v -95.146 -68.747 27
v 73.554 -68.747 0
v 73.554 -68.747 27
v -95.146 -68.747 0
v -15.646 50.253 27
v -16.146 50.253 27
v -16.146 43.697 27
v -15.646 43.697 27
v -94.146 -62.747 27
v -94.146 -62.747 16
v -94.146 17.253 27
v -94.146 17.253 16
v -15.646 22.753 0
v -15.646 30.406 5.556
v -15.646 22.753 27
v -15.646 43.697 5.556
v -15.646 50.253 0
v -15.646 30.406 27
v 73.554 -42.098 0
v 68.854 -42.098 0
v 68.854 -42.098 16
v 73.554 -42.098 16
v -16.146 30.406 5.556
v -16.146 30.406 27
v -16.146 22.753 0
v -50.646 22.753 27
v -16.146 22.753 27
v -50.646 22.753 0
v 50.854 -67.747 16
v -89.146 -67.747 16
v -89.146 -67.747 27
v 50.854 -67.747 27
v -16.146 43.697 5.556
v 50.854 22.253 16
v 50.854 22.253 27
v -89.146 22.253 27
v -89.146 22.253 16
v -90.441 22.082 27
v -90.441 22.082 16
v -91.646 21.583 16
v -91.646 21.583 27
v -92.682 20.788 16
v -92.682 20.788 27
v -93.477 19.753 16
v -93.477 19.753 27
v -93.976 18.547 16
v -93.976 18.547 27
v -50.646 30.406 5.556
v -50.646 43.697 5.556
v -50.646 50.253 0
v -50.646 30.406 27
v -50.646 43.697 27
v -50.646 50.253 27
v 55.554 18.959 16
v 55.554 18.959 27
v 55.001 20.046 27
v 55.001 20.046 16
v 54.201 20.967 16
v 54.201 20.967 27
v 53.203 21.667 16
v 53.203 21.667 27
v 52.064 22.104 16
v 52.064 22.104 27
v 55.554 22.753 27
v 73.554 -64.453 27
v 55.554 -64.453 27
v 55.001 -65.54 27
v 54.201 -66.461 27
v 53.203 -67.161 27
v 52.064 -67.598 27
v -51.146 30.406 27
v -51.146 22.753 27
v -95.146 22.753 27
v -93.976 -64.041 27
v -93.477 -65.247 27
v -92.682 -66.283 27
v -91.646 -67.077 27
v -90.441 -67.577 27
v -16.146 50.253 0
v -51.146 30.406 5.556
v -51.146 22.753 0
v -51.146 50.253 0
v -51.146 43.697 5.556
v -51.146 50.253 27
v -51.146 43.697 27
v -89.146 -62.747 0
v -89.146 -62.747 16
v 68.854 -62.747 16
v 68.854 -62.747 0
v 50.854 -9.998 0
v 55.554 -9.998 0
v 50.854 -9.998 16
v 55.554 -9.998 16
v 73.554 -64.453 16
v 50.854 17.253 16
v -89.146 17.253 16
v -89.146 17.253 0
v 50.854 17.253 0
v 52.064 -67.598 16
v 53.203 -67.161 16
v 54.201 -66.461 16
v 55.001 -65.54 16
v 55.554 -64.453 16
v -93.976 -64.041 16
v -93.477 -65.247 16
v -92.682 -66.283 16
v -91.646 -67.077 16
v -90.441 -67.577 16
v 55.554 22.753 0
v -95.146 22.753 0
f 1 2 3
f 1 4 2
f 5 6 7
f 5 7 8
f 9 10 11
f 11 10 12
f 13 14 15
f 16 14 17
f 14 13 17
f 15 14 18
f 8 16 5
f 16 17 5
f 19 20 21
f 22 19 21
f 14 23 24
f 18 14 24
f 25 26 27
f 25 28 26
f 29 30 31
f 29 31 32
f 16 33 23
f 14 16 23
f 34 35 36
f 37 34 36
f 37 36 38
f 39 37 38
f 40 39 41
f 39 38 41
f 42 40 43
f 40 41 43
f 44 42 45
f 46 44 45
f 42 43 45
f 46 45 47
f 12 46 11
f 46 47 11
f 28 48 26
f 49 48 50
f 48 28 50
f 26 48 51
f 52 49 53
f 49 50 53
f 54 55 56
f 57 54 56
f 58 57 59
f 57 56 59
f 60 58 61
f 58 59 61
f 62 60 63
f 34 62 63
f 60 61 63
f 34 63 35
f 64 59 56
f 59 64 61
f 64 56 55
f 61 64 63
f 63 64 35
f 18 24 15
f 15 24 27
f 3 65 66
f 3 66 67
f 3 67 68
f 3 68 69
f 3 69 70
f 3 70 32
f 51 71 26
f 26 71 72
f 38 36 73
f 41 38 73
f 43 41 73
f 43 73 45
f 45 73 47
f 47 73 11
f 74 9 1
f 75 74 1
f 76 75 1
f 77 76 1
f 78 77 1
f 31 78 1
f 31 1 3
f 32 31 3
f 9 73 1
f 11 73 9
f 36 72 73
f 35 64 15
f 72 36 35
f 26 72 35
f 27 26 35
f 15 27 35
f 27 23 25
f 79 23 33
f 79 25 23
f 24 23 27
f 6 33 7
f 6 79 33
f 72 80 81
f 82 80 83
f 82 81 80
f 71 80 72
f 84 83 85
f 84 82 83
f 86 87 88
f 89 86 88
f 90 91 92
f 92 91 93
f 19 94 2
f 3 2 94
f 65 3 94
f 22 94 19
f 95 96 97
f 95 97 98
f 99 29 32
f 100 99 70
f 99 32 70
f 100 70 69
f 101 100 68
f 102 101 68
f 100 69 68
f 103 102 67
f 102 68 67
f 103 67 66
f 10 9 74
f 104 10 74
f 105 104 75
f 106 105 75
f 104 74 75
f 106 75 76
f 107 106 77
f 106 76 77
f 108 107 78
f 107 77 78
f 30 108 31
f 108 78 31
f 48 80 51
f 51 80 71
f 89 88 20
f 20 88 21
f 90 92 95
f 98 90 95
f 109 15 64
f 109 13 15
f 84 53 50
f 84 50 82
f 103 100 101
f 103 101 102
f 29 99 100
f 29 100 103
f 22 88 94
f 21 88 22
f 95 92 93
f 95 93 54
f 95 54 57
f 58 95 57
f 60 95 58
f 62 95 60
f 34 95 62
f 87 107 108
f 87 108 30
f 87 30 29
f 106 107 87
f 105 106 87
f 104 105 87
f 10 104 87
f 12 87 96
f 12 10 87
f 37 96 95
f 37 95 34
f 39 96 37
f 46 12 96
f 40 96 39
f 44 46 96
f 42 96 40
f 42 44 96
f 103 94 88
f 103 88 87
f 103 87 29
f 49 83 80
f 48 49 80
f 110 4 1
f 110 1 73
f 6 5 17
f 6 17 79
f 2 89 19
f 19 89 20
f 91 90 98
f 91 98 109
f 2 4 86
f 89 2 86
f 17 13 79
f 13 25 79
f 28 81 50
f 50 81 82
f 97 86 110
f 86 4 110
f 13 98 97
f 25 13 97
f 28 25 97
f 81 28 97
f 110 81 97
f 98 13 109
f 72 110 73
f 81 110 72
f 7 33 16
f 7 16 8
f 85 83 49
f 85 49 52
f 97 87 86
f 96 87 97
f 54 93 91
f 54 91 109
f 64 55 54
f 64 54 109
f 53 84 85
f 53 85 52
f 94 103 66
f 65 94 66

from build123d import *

# Parameters (mm, degrees)
F0_W          = 170
F0_H          = 130
F1_DEPTH      = 34
F2_T          = -1
F3_W          = 43.5
F3_H          = 38
F4_DEPTH      = 32
F5_T          = 0.5
F5_T3_DEPTH   = 34
F5_T5_DEPTH   = 125.5
F5_T7_DEPTH   = 33
F5_T9_DEPTH   = 2
F5_T11_DEPTH  = 129
F5_T13_DEPTH  = 169
F5_T15_DEPTH  = 91
F5_T17_DEPTH  = 44.5
F5_T19_DEPTH  = 39
F6_W          = 35
F6_H          = 38
F7_DEPTH      = 32
F8_T          = 0.5
F8_T3_DEPTH   = 2
F8_T5_DEPTH   = 33
F8_T7_DEPTH   = 91
F8_T9_DEPTH   = 34
F8_T11_DEPTH  = 79.5
F8_T13_DEPTH  = 169
F8_T15_DEPTH  = 129
F8_T17_DEPTH  = 90.5
F8_T19_DEPTH  = 39
F8_T21_DEPTH  = 44.5
F8_T23_DEPTH  = 33.5
F8_T25_DEPTH  = 1.5
F8_T27_DEPTH  = 39
F8_T29_DEPTH  = 33
F8_T31_DEPTH  = 1.5
F8_T33_DEPTH  = 1.5
F8_T35_DEPTH  = 38.5
F8_T37_DEPTH  = 1.5000245068
F8_T39_DEPTH  = 1.5000245068
F8_T41_DEPTH  = 44
F9_W          = 89.5
F9_H          = 38
F10_DEPTH     = 32
F11_T         = 0.5
F11_T3_DEPTH  = 2
F11_T5_DEPTH  = 33
F11_T7_DEPTH  = 91
F11_T9_DEPTH  = 34
F11_T11_DEPTH = 169
F11_T13_DEPTH = 44.5
F11_T15_DEPTH = 33.5
F11_T17_DEPTH = 1.5
F11_T19_DEPTH = 39
F11_T21_DEPTH = 33
F11_T23_DEPTH = 1.5
F11_T25_DEPTH = 1.5
F11_T27_DEPTH = 38.5
F11_T29_DEPTH = 1.5000245068
F11_T31_DEPTH = 1.5000245068
F11_T33_DEPTH = 44
F11_T35_DEPTH = 35.5
F12_W         = 150
F12_H         = 90
F13_DEPTH     = 32
F15_DEPTH     = 17
F16_W         = 140
F16_H         = 80
F17_DEPTH     = 25
F18_DEPTH     = 25
F19_DEPTH     = 25
F20_DEPTH     = 25
F21_DEPTH     = 25
F24_W         = 170
F24_H         = 34
F25_DEPTH     = 11
F26_W         = 119
F26_H         = 34
F27_DEPTH     = 19.3
F28_W         = 32.0991082117
F28_H         = 16
F29_DEPTH     = 25
F30_W         = 13.2916904986
F30_H         = 28.4444186985
F31_DEPTH     = 96.3
F32_W         = 236.7293909192
F32_H         = 199.1855278611
F33_DEPTH     = 7
F34_DEPTH     = 18
F35_DEPTH     = 18
F36_DEPTH     = 27.5


# Not quite as in the source:
# - a feature of the source that left no trace in its solid (it failed there, or was rolled back) is left out
# - a shell that OpenCascade refuses in one call is made with other operations: the cavity is built on its own and cut out


with BuildPart() as f1:
    # F0 (on Top) → F1 (new body)
    with BuildSketch(Plane.XY):
        with Locations((-10.1464114764, -3.7471540272)):
            Rectangle(F0_W, F0_H)
    extrude(amount=F1_DEPTH)

    # F2
    f2_openings = [f1.faces().sort_by_distance(p)[0] for p in [
        (-10.146411, -3.747154, 34),
    ]]
    offset(amount=F2_T, openings=f2_openings)

    # F3 (on face) → F4 (join)
    with BuildSketch(Plane.XY.offset(1)):
        with Locations((-72.3964114764, 41.2528459728)):
            Rectangle(F3_W, F3_H)
    extrude(amount=F4_DEPTH)

    # F5: shell of thickness 0.5, made by hand


with BuildPart() as f5_core1:
    # F5_t2: copy of F1
    add(f1.part)

    # the walls: a layer under each face that stays
    f5_faces = [f5_core1.faces().sort_by_distance(p)[0] for p in [
        (-10.1464114764, 61.2528459728, 17),
        (74.8535885236, -3.7471540272, 17),
        (-95.1464114764, -3.7471540272, 17),
        (-10.1464114764, -3.7471540272, 0),
        (-3.5057864764, -68.2121746034, 34),
        (-10.1464114764, -68.7471540272, 17),
        (-10.1464114764, 60.2528459728, 17.5),
        (73.8535885236, -3.7471540272, 17.5),
        (-10.1464114764, -67.7471540272, 17.5),
        (-94.1464114764, -3.7471540272, 17.5),
        (-10.1464114764, -3.7471540272, 1),
        (-50.6464114764, 41.2528459728, 17),
        (-72.3964114764, 22.2528459728, 17),
    ]]
    thicken(f5_faces, amount=-F5_T, mode=Mode.SUBTRACT)

    # F5_s4 → F5_t3 (cut)
    with BuildSketch(Plane.XY.offset(0.5)):
        Polygon((73.8485885236, 60.2478459728), (73.8535885236, 60.7528459728), (74.3535885236, 60.7528459728), (74.3535885236, 60.2528459728), align=None)
        Polygon((73.8485885236, -67.7421540272), (74.3535885236, -67.7471540272), (74.3535885236, -68.2471540272), (73.8535885236, -68.2471540272), align=None)
        Polygon((-94.1414114764, -67.7421540272), (-94.1464114764, -68.2471540272), (-94.6464114764, -68.2471540272), (-94.6464114764, -67.7471540272), align=None)
    extrude(amount=F5_T3_DEPTH, mode=Mode.SUBTRACT)

    # F5_s6 → F5_t5 (cut)
    with BuildSketch(Plane.YZ.offset(-51.1464114764)):
        Polygon((60.2478459728, 1.005), (60.7528459728, 1), (60.7528459728, 0.5), (60.2528459728, 0.5), align=None)
    extrude(amount=F5_T5_DEPTH, mode=Mode.SUBTRACT)

    # F5_s8 → F5_t7 (cut)
    with BuildSketch(Plane.XY.offset(0.5)):
        Polygon((-50.6414114764, 60.2478459728), (-50.6464114764, 60.7528459728), (-51.1464114764, 60.7528459728), (-51.1464114764, 60.2528459728), align=None)
        Polygon((-94.1414114764, 22.2478459728), (-94.6464114764, 22.2528459728), (-94.6464114764, 22.7528459728), (-94.1464114764, 22.7528459728), align=None)
    extrude(amount=F5_T7_DEPTH, mode=Mode.SUBTRACT)

    # F5_s10 → F5_t9 (cut)
    with BuildSketch(Plane.XY.offset(32.5)):
        Polygon((-94.1414114764, 60.2478459728), (-94.1464114764, 60.7528459728), (-94.6464114764, 60.7528459728), (-94.6464114764, 60.2528459728), align=None)
    extrude(amount=F5_T9_DEPTH, mode=Mode.SUBTRACT)

    # F5_s12 → F5_t11 (cut)
    with BuildSketch(Plane.XZ.offset(-60.7528459728)):
        Polygon((73.8485885236, 1.005), (74.3535885236, 1), (74.3535885236, 0.5), (73.8535885236, 0.5), align=None)
    extrude(amount=F5_T11_DEPTH, mode=Mode.SUBTRACT)

    # F5_s14 → F5_t13 (cut)
    with BuildSketch(Plane.YZ.offset(-94.6464114764)):
        Polygon((-67.7421540272, 1.005), (-68.2471540272, 1), (-68.2471540272, 0.5), (-67.7471540272, 0.5), align=None)
    extrude(amount=F5_T13_DEPTH, mode=Mode.SUBTRACT)

    # F5_s16 → F5_t15 (cut)
    with BuildSketch(Plane.XZ.offset(-22.7528459728)):
        Polygon((-94.1414114764, 1.005), (-94.6464114764, 1), (-94.6464114764, 0.5), (-94.1464114764, 0.5), align=None)
    extrude(amount=F5_T15_DEPTH, mode=Mode.SUBTRACT)

    # F5_s18 → F5_t17 (cut)
    with BuildSketch(Plane.YZ.offset(-94.6464114764)):
        Polygon((22.2478459728, 1.005), (22.2528459728, 0.5), (22.7528459728, 0.5), (22.7528459728, 1), align=None)
    extrude(amount=F5_T17_DEPTH, mode=Mode.SUBTRACT)

    # F5_s20 → F5_t19 (cut)
    with BuildSketch(Plane.XZ.offset(-60.7528459728)):
        Polygon((-50.6414114764, 1.005), (-50.6464114764, 0.5), (-51.1464114764, 0.5), (-51.1464114764, 1), align=None)
    extrude(amount=F5_T19_DEPTH, mode=Mode.SUBTRACT)


with BuildPart() as f1_1:
    add(f1.part)

    # what is left inside the walls is the cavity
    f5_cavity = [f5_core1.part.solids().sort_by_distance(p)[0] for p in [
        (-72.896411, 35.419513, 0.505),
    ]]
    add(f5_cavity, mode=Mode.SUBTRACT)

    # F6 (on face) → F7 (join)
    with BuildSketch(Plane.XY.offset(1)):
        with Locations((-33.1464114764, 41.2528459728)):
            Rectangle(F6_W, F6_H)
    extrude(amount=F7_DEPTH)

    # F8: shell of thickness 0.5, made by hand


with BuildPart() as f8_core1:
    # F8_t2: copy of F1
    add(f1_1.part)

    # the walls: a layer under each face that stays
    f8_faces = [f8_core1.faces().sort_by_distance(p)[0] for p in [
        (-10.1464114764, 61.2528459728, 17),
        (-3.5057864764, -68.2121746034, 34),
        (-94.1464114764, -3.7471540272, 17.5),
        (-10.1464114764, -3.7471540272, 1),
        (-15.6464114764, 41.2528459728, 17),
        (-54.8964114764, 22.2528459728, 17),
        (-72.8964114764, 22.7528459728, 16.75),
        (-94.6464114764, 41.7528459728, 16.75),
        (-94.3939114764, 60.2503459728, 32.75),
        (-94.1439114764, 60.5003459728, 32.75),
        (-72.6464114764, 60.5028459728, 33),
        (-94.3939114764, 60.5003459728, 32.5),
        (-72.8964114764, 60.7528459728, 16.75),
        (-72.8964114764, 41.7528459728, 0.5),
        (-51.1464114764, 41.7528459728, 16.75),
        (-94.3964114764, 41.5028459728, 33),
        (-10.1464114764, -67.7471540272, 17.5),
        (73.8535885236, -3.7471540272, 17.5),
        (-10.1464114764, 60.2528459728, 17.5),
        (-10.1464114764, -68.7471540272, 17),
        (-10.1464114764, -3.7471540272, 0),
        (-95.1464114764, -3.7471540272, 17),
        (74.8535885236, -3.7471540272, 17),
    ]]
    thicken(f8_faces, amount=-F8_T, mode=Mode.SUBTRACT)

    # F8_s4 → F8_t3 (cut)
    with BuildSketch(Plane.XY.offset(32.5)):
        Polygon((-94.1414114764, 60.2478459728), (-94.6464114764, 60.2528459728), (-94.6464114764, 60.7528459728), (-94.1464114764, 60.7528459728), align=None)
    extrude(amount=F8_T3_DEPTH, mode=Mode.SUBTRACT)

    # F8_s6 → F8_t5 (cut)
    with BuildSketch(Plane.XY.offset(0.5)):
        Polygon((-94.1414114764, 22.2478459728), (-94.6464114764, 22.2528459728), (-94.6464114764, 22.7528459728), (-94.1464114764, 22.7528459728), align=None)
        Polygon((-15.6414114764, 60.2478459728), (-16.1464114764, 60.2528459728), (-16.1464114764, 60.7528459728), (-15.6464114764, 60.7528459728), align=None)
    extrude(amount=F8_T5_DEPTH, mode=Mode.SUBTRACT)

    # F8_s8 → F8_t7 (cut)
    with BuildSketch(Plane.XZ.offset(-22.7528459728)):
        Polygon((-94.1414114764, 1.005), (-94.6464114764, 1), (-94.6464114764, 0.5), (-94.1464114764, 0.5), align=None)
    extrude(amount=F8_T7_DEPTH, mode=Mode.SUBTRACT)

    # F8_s10 → F8_t9 (cut)
    with BuildSketch(Plane.XY.offset(0.5)):
        Polygon((-94.1414114764, -67.7421540272), (-94.6464114764, -67.7471540272), (-94.6464114764, -68.2471540272), (-94.1464114764, -68.2471540272), align=None)
        Polygon((73.8485885236, -67.7421540272), (73.8535885236, -68.2471540272), (74.3535885236, -68.2471540272), (74.3535885236, -67.7471540272), align=None)
        Polygon((73.8485885236, 60.2478459728), (74.3535885236, 60.2528459728), (74.3535885236, 60.7528459728), (73.8535885236, 60.7528459728), align=None)
    extrude(amount=F8_T9_DEPTH, mode=Mode.SUBTRACT)

    # F8_s12 → F8_t11 (cut)
    with BuildSketch(Plane.YZ.offset(-94.6464114764)):
        Polygon((22.2478459728, 1.005), (22.2528459728, 0.5), (22.7528459728, 0.5), (22.7528459728, 1), align=None)
    extrude(amount=F8_T11_DEPTH, mode=Mode.SUBTRACT)

    # F8_s14 → F8_t13 (cut)
    with BuildSketch(Plane.YZ.offset(-94.6464114764)):
        Polygon((-67.7421540272, 1.005), (-67.7471540272, 0.5), (-68.2471540272, 0.5), (-68.2471540272, 1), align=None)
    extrude(amount=F8_T13_DEPTH, mode=Mode.SUBTRACT)

    # F8_s16 → F8_t15 (cut)
    with BuildSketch(Plane.XZ.offset(-60.7528459728)):
        Polygon((73.8485885236, 1.005), (73.8535885236, 0.5), (74.3535885236, 0.5), (74.3535885236, 1), align=None)
    extrude(amount=F8_T15_DEPTH, mode=Mode.SUBTRACT)

    # F8_s18 → F8_t17 (cut)
    with BuildSketch(Plane.YZ.offset(-16.1464114764)):
        Polygon((60.2478459728, 1.005), (60.2528459728, 0.5), (60.7528459728, 0.5), (60.7528459728, 1), align=None)
    extrude(amount=F8_T17_DEPTH, mode=Mode.SUBTRACT)

    # F8_s20 → F8_t19 (cut)
    with BuildSketch(Plane.XZ.offset(-60.7528459728)):
        Polygon((-15.6414114764, 1.005), (-15.6464114764, 0.5), (-16.1464114764, 0.5), (-16.1464114764, 1), align=None)
    extrude(amount=F8_T19_DEPTH, mode=Mode.SUBTRACT)

    # F8_s22 → F8_t21 (cut)
    with BuildSketch(Plane.YZ.offset(-95.1464114764)):
        Polygon((22.7578459728, 0.505), (22.2528459728, 0.5), (22.2528459728, 0), (22.7528459728, 0), align=None)
        Polygon((60.7478459728, 0.505), (61.2528459728, 0.5), (61.2528459728, 0), (60.7528459728, 0), align=None)
    extrude(amount=F8_T21_DEPTH, mode=Mode.SUBTRACT)

    # F8_s24 → F8_t23 (cut)
    with BuildSketch(Plane.XY):
        Polygon((-94.6414114764, 22.7578459728), (-94.6464114764, 22.2528459728), (-95.1464114764, 22.2528459728), (-95.1464114764, 22.7528459728), align=None)
        Polygon((-51.1514114764, 22.7578459728), (-51.1464114764, 22.2528459728), (-50.6464114764, 22.2528459728), (-50.6464114764, 22.7528459728), align=None)
        Polygon((-51.1514114764, 60.7478459728), (-51.1464114764, 61.2528459728), (-50.6464114764, 61.2528459728), (-50.6464114764, 60.7528459728), align=None)
    extrude(amount=F8_T23_DEPTH, mode=Mode.SUBTRACT)

    # F8_s26 → F8_t25 (cut)
    with BuildSketch(Plane.YZ.offset(-95.1464114764)):
        Polygon((22.7578459728, 32.995), (22.2528459728, 33), (22.2528459728, 33.5), (22.7528459728, 33.5), align=None)
        Polygon((60.7478459728, 32.495), (60.7528459728, 33), (61.2528459728, 33), (61.2528459728, 32.5), align=None)
    extrude(amount=F8_T25_DEPTH, mode=Mode.SUBTRACT)

    # F8_s28 → F8_t27 (cut)
    with BuildSketch(Plane.XZ.offset(-61.2528459728)):
        Polygon((-94.6414114764, 0.505), (-95.1464114764, 0.5), (-95.1464114764, 0), (-94.6464114764, 0), align=None)
        Polygon((-51.1514114764, 0.505), (-51.1464114764, 0), (-50.6464114764, 0), (-50.6464114764, 0.5), align=None)
    extrude(amount=F8_T27_DEPTH, mode=Mode.SUBTRACT)

    # F8_s30 → F8_t29 (cut)
    with BuildSketch(Plane.XY):
        Polygon((-94.6414114764, 60.7478459728), (-95.1464114764, 60.7528459728), (-95.1464114764, 61.2528459728), (-94.6464114764, 61.2528459728), align=None)
    extrude(amount=F8_T29_DEPTH, mode=Mode.SUBTRACT)

    # F8_s32 → F8_t31 (cut)
    with BuildSketch(Plane.XZ.offset(-61.2528459728)):
        Polygon((-94.6414114764, 32.495), (-95.1464114764, 32.5), (-95.1464114764, 33), (-94.6464114764, 33), align=None)
        Polygon((-51.1514114764, 32.995), (-51.1464114764, 33.5), (-50.6464114764, 33.5), (-50.6464114764, 33), align=None)
    extrude(amount=F8_T31_DEPTH, mode=Mode.SUBTRACT)

    # F8_s34 → F8_t33 (cut)
    with BuildSketch(Plane.XY.offset(32)):
        Polygon((-94.6414609789, 60.2478462179), (-95.1464114764, 60.2528459728), (-95.1464114764, 60.7578209747), (-94.641461224, 60.7528214672), align=None)
        Polygon((-94.1414117215, 60.7478954753), (-94.6463869708, 60.7478957204), (-94.6513864783, 61.2528459728), (-94.1464114764, 61.2528459728), align=None)
    extrude(amount=F8_T33_DEPTH, mode=Mode.SUBTRACT)

    # F8_s36 → F8_t35 (cut)
    with BuildSketch(Plane.XZ.offset(-60.7528459728)):
        Polygon((-94.6414114764, 32.995), (-95.1464114764, 33), (-95.1464114764, 33.5), (-94.6464114764, 33.5), align=None)
    extrude(amount=F8_T35_DEPTH, mode=Mode.SUBTRACT)

    # F8_s38 → F8_t37 (cut)
    with BuildSketch(Plane(origin=(-95.7336140862, 0.9478575652, 0), x_dir=(0, 0, 1), z_dir=(0.9999509888, -0.0099005048, 0))):
        Polygon((32.995, -59.3078456537), (33, -59.8128456537), (33.5, -59.8128456537), (33.5, -59.3128456537), align=None)
    extrude(amount=F8_T37_DEPTH, mode=Mode.SUBTRACT)

    # F8_s40 → F8_t39 (cut)
    with BuildSketch(Plane(origin=(-0.6007818495, 60.6789668039, 0), x_dir=(0, 0, 1), z_dir=(-0.0099005048, 0.9999509888, 0))):
        Polygon((32.995, -93.5353134023), (33, -94.0403134023), (33.5, -94.0403134023), (33.5, -93.5403134023), align=None)
    extrude(amount=F8_T39_DEPTH, mode=Mode.SUBTRACT)

    # F8_s42 → F8_t41 (cut)
    with BuildSketch(Plane.YZ.offset(-94.6464114764)):
        Polygon((60.7478459728, 32.995), (60.7528459728, 33.5), (61.2528459728, 33.5), (61.2528459728, 33), align=None)
    extrude(amount=F8_T41_DEPTH, mode=Mode.SUBTRACT)


with BuildPart() as f1_2:
    add(f1_1.part)

    # what is left inside the walls is the cavity
    f8_cavity = [f8_core1.part.solids().sort_by_distance(p)[0] for p in [
        (-33.396411, 35.419513, 32.995),
    ]]
    add(f8_cavity, mode=Mode.SUBTRACT)

    # F9 (on face) → F10 (join)
    with BuildSketch(Plane.XY.offset(1)):
        with Locations((29.1035885236, 41.2528459728)):
            Rectangle(F9_W, F9_H)
    extrude(amount=F10_DEPTH)

    # F11: shell of thickness 0.5, made by hand


with BuildPart() as f11_core1:
    # F11_t2: copy of F1
    add(f1_2.part)

    # the walls: a layer under each face that stays
    f11_faces = [f11_core1.faces().sort_by_distance(p)[0] for p in [
        (-10.1464114764, 61.2528459728, 17),
        (-3.5057864764, -68.2121746034, 34),
        (-94.1464114764, -3.7471540272, 17.5),
        (-10.1464114764, -22.7471540272, 1),
        (-10.1464114764, 22.2528459728, 17),
        (-72.8964114764, 22.7528459728, 16.75),
        (-94.6464114764, 41.7528459728, 16.75),
        (-94.3939114764, 60.2503459728, 32.75),
        (-94.1439114764, 60.5003459728, 32.75),
        (-72.6464114764, 60.5028459728, 33),
        (-94.3939114764, 60.5003459728, 32.5),
        (-72.8964114764, 60.7528459728, 16.75),
        (-72.8964114764, 41.7528459728, 0.5),
        (-51.1464114764, 41.7528459728, 16.75),
        (-50.6464114764, 41.7528459728, 16.75),
        (-33.3964114764, 60.7528459728, 16.75),
        (-33.3964114764, 41.7528459728, 0.5),
        (-33.3964114764, 60.5028459728, 33),
        (-33.3964114764, 22.7528459728, 16.75),
        (-16.1464114764, 41.7528459728, 16.75),
        (-94.3964114764, 41.5028459728, 33),
        (-10.1464114764, -67.7471540272, 17.5),
        (73.8535885236, -3.7471540272, 17.5),
        (-10.1464114764, 60.2528459728, 33.5),
        (-10.1464114764, -68.7471540272, 17),
        (-10.1464114764, -3.7471540272, 0),
        (-95.1464114764, -3.7471540272, 17),
        (74.8535885236, -3.7471540272, 17),
    ]]
    thicken(f11_faces, amount=-F11_T, mode=Mode.SUBTRACT)

    # F11_s4 → F11_t3 (cut)
    with BuildSketch(Plane.XY.offset(32.5)):
        Polygon((-94.1414114764, 60.2478459728), (-94.6464114764, 60.2528459728), (-94.6464114764, 60.7528459728), (-94.1464114764, 60.7528459728), align=None)
        Polygon((73.8485885236, 60.2478459728), (74.3535885236, 60.2528459728), (74.3535885236, 60.7528459728), (73.8535885236, 60.7528459728), align=None)
    extrude(amount=F11_T3_DEPTH, mode=Mode.SUBTRACT)

    # F11_s6 → F11_t5 (cut)
    with BuildSketch(Plane.XY.offset(0.5)):
        Polygon((-94.1414114764, 22.2478459728), (-94.6464114764, 22.2528459728), (-94.6464114764, 22.7528459728), (-94.1464114764, 22.7528459728), align=None)
        Polygon((73.8485885236, 22.2478459728), (73.8535885236, 22.7528459728), (74.3535885236, 22.7528459728), (74.3535885236, 22.2528459728), align=None)
    extrude(amount=F11_T5_DEPTH, mode=Mode.SUBTRACT)

    # F11_s8 → F11_t7 (cut)
    with BuildSketch(Plane.XZ.offset(-22.7528459728)):
        Polygon((-94.1414114764, 1.005), (-94.6464114764, 1), (-94.6464114764, 0.5), (-94.1464114764, 0.5), align=None)
        Polygon((73.8485885236, 1.005), (73.8535885236, 0.5), (74.3535885236, 0.5), (74.3535885236, 1), align=None)
    extrude(amount=F11_T7_DEPTH, mode=Mode.SUBTRACT)

    # F11_s10 → F11_t9 (cut)
    with BuildSketch(Plane.XY.offset(0.5)):
        Polygon((-94.1414114764, -67.7421540272), (-94.6464114764, -67.7471540272), (-94.6464114764, -68.2471540272), (-94.1464114764, -68.2471540272), align=None)
        Polygon((73.8485885236, -67.7421540272), (73.8535885236, -68.2471540272), (74.3535885236, -68.2471540272), (74.3535885236, -67.7471540272), align=None)
    extrude(amount=F11_T9_DEPTH, mode=Mode.SUBTRACT)

    # F11_s12 → F11_t11 (cut)
    with BuildSketch(Plane.YZ.offset(-94.6464114764)):
        Polygon((22.2478459728, 1.005), (22.2528459728, 0.5), (22.7528459728, 0.5), (22.7528459728, 1), align=None)
        Polygon((-67.7421540272, 1.005), (-67.7471540272, 0.5), (-68.2471540272, 0.5), (-68.2471540272, 1), align=None)
    extrude(amount=F11_T11_DEPTH, mode=Mode.SUBTRACT)

    # F11_s14 → F11_t13 (cut)
    with BuildSketch(Plane.YZ.offset(-95.1464114764)):
        Polygon((22.7578459728, 0.505), (22.2528459728, 0.5), (22.2528459728, 0), (22.7528459728, 0), align=None)
        Polygon((60.7478459728, 0.505), (61.2528459728, 0.5), (61.2528459728, 0), (60.7528459728, 0), align=None)
    extrude(amount=F11_T13_DEPTH, mode=Mode.SUBTRACT)

    # F11_s16 → F11_t15 (cut)
    with BuildSketch(Plane.XY):
        Polygon((-94.6414114764, 22.7578459728), (-94.6464114764, 22.2528459728), (-95.1464114764, 22.2528459728), (-95.1464114764, 22.7528459728), align=None)
        Polygon((-51.1514114764, 22.7578459728), (-51.1464114764, 22.2528459728), (-50.6464114764, 22.2528459728), (-50.6464114764, 22.7528459728), align=None)
        Polygon((-51.1514114764, 60.7478459728), (-51.1464114764, 61.2528459728), (-50.6464114764, 61.2528459728), (-50.6464114764, 60.7528459728), align=None)
        Polygon((-50.6414114764, 22.7578459728), (-51.1464114764, 22.7528459728), (-51.1464114764, 22.2528459728), (-50.6464114764, 22.2528459728), align=None)
        Polygon((-50.6414114764, 60.7478459728), (-51.1464114764, 60.7528459728), (-51.1464114764, 61.2528459728), (-50.6464114764, 61.2528459728), align=None)
        Polygon((-16.1514114764, 60.7478459728), (-16.1464114764, 61.2528459728), (-15.6464114764, 61.2528459728), (-15.6464114764, 60.7528459728), align=None)
        Polygon((-16.1514114764, 22.7578459728), (-16.1464114764, 22.2528459728), (-15.6464114764, 22.2528459728), (-15.6464114764, 22.7528459728), align=None)
    extrude(amount=F11_T15_DEPTH, mode=Mode.SUBTRACT)

    # F11_s18 → F11_t17 (cut)
    with BuildSketch(Plane.YZ.offset(-95.1464114764)):
        Polygon((22.7578459728, 32.995), (22.2528459728, 33), (22.2528459728, 33.5), (22.7528459728, 33.5), align=None)
        Polygon((60.7478459728, 32.495), (60.7528459728, 33), (61.2528459728, 33), (61.2528459728, 32.5), align=None)
    extrude(amount=F11_T17_DEPTH, mode=Mode.SUBTRACT)

    # F11_s20 → F11_t19 (cut)
    with BuildSketch(Plane.XZ.offset(-61.2528459728)):
        Polygon((-94.6414114764, 0.505), (-95.1464114764, 0.5), (-95.1464114764, 0), (-94.6464114764, 0), align=None)
        Polygon((-51.1514114764, 0.505), (-51.1464114764, 0), (-50.6464114764, 0), (-50.6464114764, 0.5), align=None)
        Polygon((-50.6414114764, 0.505), (-51.1464114764, 0.5), (-51.1464114764, 0), (-50.6464114764, 0), align=None)
        Polygon((-16.1514114764, 0.505), (-16.1464114764, 0), (-15.6464114764, 0), (-15.6464114764, 0.5), align=None)
    extrude(amount=F11_T19_DEPTH, mode=Mode.SUBTRACT)

    # F11_s22 → F11_t21 (cut)
    with BuildSketch(Plane.XY):
        Polygon((-94.6414114764, 60.7478459728), (-95.1464114764, 60.7528459728), (-95.1464114764, 61.2528459728), (-94.6464114764, 61.2528459728), align=None)
    extrude(amount=F11_T21_DEPTH, mode=Mode.SUBTRACT)

    # F11_s24 → F11_t23 (cut)
    with BuildSketch(Plane.XZ.offset(-61.2528459728)):
        Polygon((-94.6414114764, 32.495), (-95.1464114764, 32.5), (-95.1464114764, 33), (-94.6464114764, 33), align=None)
        Polygon((-51.1514114764, 32.995), (-51.1464114764, 33.5), (-50.6464114764, 33.5), (-50.6464114764, 33), align=None)
        Polygon((-50.6414114764, 32.995), (-51.1464114764, 33), (-51.1464114764, 33.5), (-50.6464114764, 33.5), align=None)
        Polygon((-16.1514114764, 32.995), (-16.1464114764, 33.5), (-15.6464114764, 33.5), (-15.6464114764, 33), align=None)
    extrude(amount=F11_T23_DEPTH, mode=Mode.SUBTRACT)

    # F11_s26 → F11_t25 (cut)
    with BuildSketch(Plane.XY.offset(32)):
        Polygon((-94.6414609789, 60.2478462179), (-95.1464114764, 60.2528459728), (-95.1464114764, 60.7578209747), (-94.641461224, 60.7528214672), align=None)
        Polygon((-94.1414117215, 60.7478954753), (-94.6463869708, 60.7478957204), (-94.6513864783, 61.2528459728), (-94.1464114764, 61.2528459728), align=None)
    extrude(amount=F11_T25_DEPTH, mode=Mode.SUBTRACT)

    # F11_s28 → F11_t27 (cut)
    with BuildSketch(Plane.XZ.offset(-60.7528459728)):
        Polygon((-94.6414114764, 32.995), (-95.1464114764, 33), (-95.1464114764, 33.5), (-94.6464114764, 33.5), align=None)
    extrude(amount=F11_T27_DEPTH, mode=Mode.SUBTRACT)

    # F11_s30 → F11_t29 (cut)
    with BuildSketch(Plane(origin=(-95.7336140862, 0.9478575652, 0), x_dir=(0, 0, 1), z_dir=(0.9999509888, -0.0099005048, 0))):
        Polygon((32.995, -59.3078456537), (33, -59.8128456537), (33.5, -59.8128456537), (33.5, -59.3128456537), align=None)
    extrude(amount=F11_T29_DEPTH, mode=Mode.SUBTRACT)

    # F11_s32 → F11_t31 (cut)
    with BuildSketch(Plane(origin=(-0.6007818495, 60.6789668039, 0), x_dir=(0, 0, 1), z_dir=(-0.0099005048, 0.9999509888, 0))):
        Polygon((32.995, -93.5353134023), (33, -94.0403134023), (33.5, -94.0403134023), (33.5, -93.5403134023), align=None)
    extrude(amount=F11_T31_DEPTH, mode=Mode.SUBTRACT)

    # F11_s34 → F11_t33 (cut)
    with BuildSketch(Plane.YZ.offset(-94.6464114764)):
        Polygon((60.7478459728, 32.995), (60.7528459728, 33.5), (61.2528459728, 33.5), (61.2528459728, 33), align=None)
    extrude(amount=F11_T33_DEPTH, mode=Mode.SUBTRACT)

    # F11_s36 → F11_t35 (cut)
    with BuildSketch(Plane.YZ.offset(-51.1464114764)):
        Polygon((60.7478459728, 0.505), (61.2528459728, 0.5), (61.2528459728, 0), (60.7528459728, 0), align=None)
        Polygon((60.7478459728, 32.995), (61.2528459728, 33), (61.2528459728, 33.5), (60.7528459728, 33.5), align=None)
        Polygon((22.7578459728, 0.505), (22.7528459728, 0), (22.2528459728, 0), (22.2528459728, 0.5), align=None)
    extrude(amount=F11_T35_DEPTH, mode=Mode.SUBTRACT)


with BuildPart() as f1_3:
    add(f1_2.part)

    # what is left inside the walls is the cavity
    f11_cavity = [f11_core1.part.solids().sort_by_distance(p)[0] for p in [
        (29.353589, 35.419513, 0.505),
    ]]
    add(f11_cavity, mode=Mode.SUBTRACT)

    # F12 (on face) → F13 (join)
    with BuildSketch(Plane.XY.offset(1)):
        with Locations((-19.1464114764, -22.7471540272)):
            Rectangle(F12_W, F12_H)
    extrude(amount=F13_DEPTH)

    # F14 (on face) → F15 (cut)
    with BuildSketch(Plane.XY.offset(33)):
        with BuildLine():
            Line((50.8535885236, 22.2528459728), (-89.1464114764, 22.2528459728))
            ThreePointArc((-89.1464114764, 22.2528459728), (-92.6819453823, 20.7883798787), (-94.1464114764, 17.2528459728))
            Line((-94.1464114764, 17.2528459728), (-94.1464114764, -62.7471540272))
            ThreePointArc((-94.1464114764, -62.7471540272), (-92.6819453823, -66.2826879332), (-89.1464114764, -67.7471540272))
            Line((-89.1464114764, -67.7471540272), (50.8535885236, -67.7471540272))
            ThreePointArc((50.8535885236, -67.7471540272), (54.3891224295, -66.2826879332), (55.8535885236, -62.7471540272))
            Line((55.8535885236, -62.7471540272), (55.8535885236, 17.2528459728))
            ThreePointArc((55.8535885236, 17.2528459728), (54.3891224295, 20.7883798787), (50.8535885236, 22.2528459728))
        make_face()
    extrude(amount=-F15_DEPTH, mode=Mode.SUBTRACT)

    # F16 (on face) → F17 (cut)
    with BuildSketch(Plane.XY.offset(16)):
        with Locations((-19.1464114764, -22.7471540272)):
            Rectangle(F16_W, F16_H)
    extrude(amount=-F17_DEPTH, mode=Mode.SUBTRACT)

    # F18 (cut): a face of the model
    f18_faces = [f1_3.faces().sort_by_distance(p)[0] for p in [
        (-72.8964114764, 41.7528459728, 0.5),
    ]]
    extrude(f18_faces, amount=-F18_DEPTH, mode=Mode.SUBTRACT)

    # F19 (cut): a face of the model
    f19_faces = [f1_3.faces().sort_by_distance(p)[0] for p in [
        (-33.3964114764, 41.7528459728, 0.5),
    ]]
    extrude(f19_faces, amount=-F19_DEPTH, mode=Mode.SUBTRACT)

    # F20 (cut): a face of the model
    f20_faces = [f1_3.faces().sort_by_distance(p)[0] for p in [
        (29.3535885236, 41.7528459728, 0.5),
    ]]
    extrude(f20_faces, amount=-F20_DEPTH, mode=Mode.SUBTRACT)

    # F21 (cut): a face of the model
    f21_faces = [f1_3.faces().sort_by_distance(p)[0] for p in [
        (64.8535885236, -22.7471540272, 1),
    ]]
    extrude(f21_faces, amount=-F21_DEPTH, mode=Mode.SUBTRACT)

    # F24 (on face) → F25 (cut)
    with BuildSketch(Plane(origin=(0, 61.2528459728, 0), x_dir=(-1, 0, 0), z_dir=(0, 1, 0))):
        with Locations((10.1464114764, 17)):
            Rectangle(F24_W, F24_H)
    extrude(amount=-F25_DEPTH, mode=Mode.SUBTRACT)

    # F26 (on face) → F27 (cut)
    with BuildSketch(Plane.YZ.offset(74.8535885236)):
        with Locations((-9.2471540272, 17)):
            Rectangle(F26_W, F26_H)
    extrude(amount=-F27_DEPTH, mode=Mode.SUBTRACT)

    # F28 (on face) → F29 (cut)
    with BuildSketch(Plane.YZ.offset(55.5535885236)):
        with Locations((-26.0480144061, 8)):
            Rectangle(F28_W, F28_H)
    extrude(amount=-F29_DEPTH, mode=Mode.SUBTRACT)

    # F30 (on face) → F31 (cut)
    with BuildSketch(Plane(origin=(-95.1464114764, 0, 0), x_dir=(0, -1, 0), z_dir=(-1, 0, 0))):
        with Locations((-37.051377818, 19.7777906507)):
            Rectangle(F30_W, F30_H)
    extrude(amount=-F31_DEPTH, mode=Mode.SUBTRACT)

    # F32 (on face) → F33 (cut)
    with BuildSketch(Plane.XY.offset(34)):
        with Locations((13.9653496444, 0.8634440601)):
            Rectangle(F32_W, F32_H)
    extrude(amount=-F33_DEPTH, mode=Mode.SUBTRACT)

    # F34 (add): a face of the model
    f34_faces = [f1_3.faces().sort_by_distance(p)[0] for p in [
        (55.5535885236, -56.5371257993, 9.346366631),
    ]]
    extrude(f34_faces, amount=F34_DEPTH)

    # F35 (cut): a face of the model
    f35_faces = [f1_3.faces().sort_by_distance(p)[0] for p in [
        (50.8535885236, -52.4223612696, 8),
    ]]
    extrude(f35_faces, amount=-F35_DEPTH, mode=Mode.SUBTRACT)

    # F36 (cut): a face of the model
    f36_faces = [f1_3.faces().sort_by_distance(p)[0] for p in [
        (-94.8964114764, 50.2528459728, 13.5),
    ]]
    extrude(f36_faces, amount=-F36_DEPTH, mode=Mode.SUBTRACT)


solid = f1_3.part
